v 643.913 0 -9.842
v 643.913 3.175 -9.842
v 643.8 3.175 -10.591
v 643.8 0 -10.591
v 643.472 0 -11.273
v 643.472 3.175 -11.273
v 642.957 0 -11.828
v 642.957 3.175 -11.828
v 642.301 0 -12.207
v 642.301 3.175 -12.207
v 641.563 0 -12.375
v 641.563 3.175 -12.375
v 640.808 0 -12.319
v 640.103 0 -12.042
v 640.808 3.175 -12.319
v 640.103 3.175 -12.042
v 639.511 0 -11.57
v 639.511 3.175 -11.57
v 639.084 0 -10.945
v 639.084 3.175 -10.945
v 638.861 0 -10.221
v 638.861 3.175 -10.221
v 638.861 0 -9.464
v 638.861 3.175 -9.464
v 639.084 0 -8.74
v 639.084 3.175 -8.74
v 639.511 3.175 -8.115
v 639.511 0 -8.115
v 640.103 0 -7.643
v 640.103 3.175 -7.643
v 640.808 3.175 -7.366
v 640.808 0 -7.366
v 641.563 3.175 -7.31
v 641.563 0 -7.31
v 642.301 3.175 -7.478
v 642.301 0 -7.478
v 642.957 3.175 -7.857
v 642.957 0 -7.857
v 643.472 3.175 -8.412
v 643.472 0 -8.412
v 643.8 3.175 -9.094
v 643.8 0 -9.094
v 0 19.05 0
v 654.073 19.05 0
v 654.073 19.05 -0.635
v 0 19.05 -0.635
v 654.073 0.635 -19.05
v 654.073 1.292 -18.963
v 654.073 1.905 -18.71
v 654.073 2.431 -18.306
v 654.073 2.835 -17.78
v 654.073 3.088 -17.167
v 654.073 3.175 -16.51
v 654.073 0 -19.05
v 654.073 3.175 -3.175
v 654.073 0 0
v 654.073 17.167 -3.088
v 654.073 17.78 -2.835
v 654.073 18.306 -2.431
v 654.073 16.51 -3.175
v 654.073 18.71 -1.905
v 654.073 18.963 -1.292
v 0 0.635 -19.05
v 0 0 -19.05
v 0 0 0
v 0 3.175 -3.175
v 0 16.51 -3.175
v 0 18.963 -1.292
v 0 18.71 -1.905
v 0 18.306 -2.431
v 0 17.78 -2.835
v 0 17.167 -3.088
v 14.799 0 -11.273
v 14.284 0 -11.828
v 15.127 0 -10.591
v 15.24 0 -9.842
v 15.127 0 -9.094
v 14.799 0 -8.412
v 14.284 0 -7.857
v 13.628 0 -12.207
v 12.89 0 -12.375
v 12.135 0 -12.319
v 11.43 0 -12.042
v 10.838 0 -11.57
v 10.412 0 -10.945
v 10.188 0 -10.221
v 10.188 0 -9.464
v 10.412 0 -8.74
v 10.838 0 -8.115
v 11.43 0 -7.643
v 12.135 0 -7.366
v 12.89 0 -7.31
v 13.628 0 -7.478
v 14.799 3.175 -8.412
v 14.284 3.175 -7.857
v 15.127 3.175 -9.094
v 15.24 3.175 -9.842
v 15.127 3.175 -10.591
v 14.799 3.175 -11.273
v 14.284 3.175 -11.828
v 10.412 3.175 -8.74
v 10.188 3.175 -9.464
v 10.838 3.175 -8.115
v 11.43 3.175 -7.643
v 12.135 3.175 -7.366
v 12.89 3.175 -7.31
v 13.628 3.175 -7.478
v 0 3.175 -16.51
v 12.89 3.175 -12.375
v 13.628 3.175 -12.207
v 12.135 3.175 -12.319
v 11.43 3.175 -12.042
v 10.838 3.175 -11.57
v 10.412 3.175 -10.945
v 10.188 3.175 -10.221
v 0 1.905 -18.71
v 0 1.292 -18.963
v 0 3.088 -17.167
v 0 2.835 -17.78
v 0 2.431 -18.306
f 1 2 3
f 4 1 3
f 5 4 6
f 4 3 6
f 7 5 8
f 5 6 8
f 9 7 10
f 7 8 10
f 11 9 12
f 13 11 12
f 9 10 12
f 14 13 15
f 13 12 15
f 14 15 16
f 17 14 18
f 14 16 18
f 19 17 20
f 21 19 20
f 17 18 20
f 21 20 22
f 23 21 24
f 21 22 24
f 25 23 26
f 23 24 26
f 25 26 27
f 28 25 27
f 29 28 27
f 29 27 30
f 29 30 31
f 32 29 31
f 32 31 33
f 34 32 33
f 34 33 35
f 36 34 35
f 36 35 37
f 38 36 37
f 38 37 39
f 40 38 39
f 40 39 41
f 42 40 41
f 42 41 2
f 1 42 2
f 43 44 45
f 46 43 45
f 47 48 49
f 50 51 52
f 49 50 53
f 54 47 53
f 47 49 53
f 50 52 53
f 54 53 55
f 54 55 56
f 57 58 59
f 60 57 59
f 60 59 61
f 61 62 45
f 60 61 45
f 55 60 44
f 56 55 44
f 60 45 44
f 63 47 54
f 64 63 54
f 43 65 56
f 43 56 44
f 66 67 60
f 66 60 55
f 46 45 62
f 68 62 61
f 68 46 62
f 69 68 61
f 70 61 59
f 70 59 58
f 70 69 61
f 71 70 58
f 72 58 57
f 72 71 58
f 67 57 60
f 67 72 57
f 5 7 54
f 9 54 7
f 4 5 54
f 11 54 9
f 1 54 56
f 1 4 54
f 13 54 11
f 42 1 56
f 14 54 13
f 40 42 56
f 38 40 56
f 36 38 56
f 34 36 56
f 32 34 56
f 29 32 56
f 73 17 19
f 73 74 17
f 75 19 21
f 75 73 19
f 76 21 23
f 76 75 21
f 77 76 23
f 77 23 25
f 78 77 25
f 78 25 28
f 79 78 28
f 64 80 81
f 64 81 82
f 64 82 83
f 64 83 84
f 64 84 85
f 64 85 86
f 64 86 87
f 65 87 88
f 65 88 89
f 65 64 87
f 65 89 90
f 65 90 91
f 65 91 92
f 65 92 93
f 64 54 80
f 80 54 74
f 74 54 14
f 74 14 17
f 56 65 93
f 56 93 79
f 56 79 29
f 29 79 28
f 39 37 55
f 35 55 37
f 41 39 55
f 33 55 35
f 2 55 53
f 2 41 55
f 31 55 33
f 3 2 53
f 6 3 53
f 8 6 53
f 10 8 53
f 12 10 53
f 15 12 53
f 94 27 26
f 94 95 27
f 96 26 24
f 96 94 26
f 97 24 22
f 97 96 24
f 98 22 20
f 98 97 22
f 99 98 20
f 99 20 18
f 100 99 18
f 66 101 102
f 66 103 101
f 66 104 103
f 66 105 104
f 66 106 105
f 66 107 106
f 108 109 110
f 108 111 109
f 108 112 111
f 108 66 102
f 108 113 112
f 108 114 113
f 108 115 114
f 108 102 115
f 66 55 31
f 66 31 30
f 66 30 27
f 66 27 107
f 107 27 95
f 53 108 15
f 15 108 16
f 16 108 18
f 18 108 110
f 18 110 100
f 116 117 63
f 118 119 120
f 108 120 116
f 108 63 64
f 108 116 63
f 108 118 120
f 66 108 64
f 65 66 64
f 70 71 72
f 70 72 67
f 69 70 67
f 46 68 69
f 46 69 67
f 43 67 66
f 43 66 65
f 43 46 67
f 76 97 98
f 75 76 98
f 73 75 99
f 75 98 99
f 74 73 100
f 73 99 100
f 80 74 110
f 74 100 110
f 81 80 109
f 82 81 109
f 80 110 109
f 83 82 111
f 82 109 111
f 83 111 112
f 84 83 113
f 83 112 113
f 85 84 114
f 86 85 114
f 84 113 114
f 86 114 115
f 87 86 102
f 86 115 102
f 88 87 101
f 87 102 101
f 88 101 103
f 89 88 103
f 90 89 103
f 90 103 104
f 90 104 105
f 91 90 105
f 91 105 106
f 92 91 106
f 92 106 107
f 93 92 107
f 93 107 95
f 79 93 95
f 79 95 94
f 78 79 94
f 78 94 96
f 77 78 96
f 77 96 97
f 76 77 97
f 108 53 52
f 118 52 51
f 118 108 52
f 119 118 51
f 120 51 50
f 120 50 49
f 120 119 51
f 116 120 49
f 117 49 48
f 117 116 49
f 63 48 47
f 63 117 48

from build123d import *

# Parameters (mm, degrees)
BOSS_EXTRUDE1_DEPTH = 654.07286
CUT_EXTRUDE1_REACH  = 5.175
SKETCH2_R           = 2.54


with BuildPart() as part:
    # Sketch1 → Boss-Extrude1 (new body)
    with BuildSketch(Plane(origin=(0, 0, 0), x_dir=(0, 0, -1), z_dir=(1, 0, 0))):
        with BuildLine():
            Line((3.175, 3.175), (16.51, 3.175))
            ThreePointArc((16.51, 3.175), (18.306051224, 2.431051224), (19.05, 0.635))
            Line((19.05, 0.635), (19.05, 0))
            Line((19.05, 0), (0, 0))
            Line((0, 0), (0, 19.05))
            Line((0, 19.05), (0.635, 19.05))
            ThreePointArc((0.635, 19.05), (2.431051224, 18.306051224), (3.175, 16.51))
            Line((3.175, 16.51), (3.175, 3.175))
        make_face()
    extrude(amount=BOSS_EXTRUDE1_DEPTH)

    # Sketch2 → Cut-Extrude1 (cut, up to next)
    with BuildSketch(Plane(origin=(0, 3.175, 0), x_dir=(1, 0, 0), z_dir=(0, 1, 0)), mode=Mode.PRIVATE) as cut_extrude1_sk1:
        with Locations((641.37286, 9.8425)):
            Circle(SKETCH2_R)
    cut_extrude1_tool1 = extrude(cut_extrude1_sk1.sketch, amount=-CUT_EXTRUDE1_REACH, mode=Mode.PRIVATE) & part.part
    add(cut_extrude1_tool1.solids().sort_by_distance((641.37286, 3.175, -9.8425))[0], mode=Mode.SUBTRACT)
    # Sketch2 → Cut-Extrude1 (cut, up to next)
    with BuildSketch(Plane(origin=(0, 3.175, 0), x_dir=(1, 0, 0), z_dir=(0, 1, 0)), mode=Mode.PRIVATE) as cut_extrude1_sk2:
        with Locations((12.7, 9.8425)):
            Circle(SKETCH2_R)
    cut_extrude1_tool2 = extrude(cut_extrude1_sk2.sketch, amount=-CUT_EXTRUDE1_REACH, mode=Mode.PRIVATE) & part.part
    add(cut_extrude1_tool2.solids().sort_by_distance((12.7, 3.175, -9.8425))[0], mode=Mode.SUBTRACT)


solid = part.part
